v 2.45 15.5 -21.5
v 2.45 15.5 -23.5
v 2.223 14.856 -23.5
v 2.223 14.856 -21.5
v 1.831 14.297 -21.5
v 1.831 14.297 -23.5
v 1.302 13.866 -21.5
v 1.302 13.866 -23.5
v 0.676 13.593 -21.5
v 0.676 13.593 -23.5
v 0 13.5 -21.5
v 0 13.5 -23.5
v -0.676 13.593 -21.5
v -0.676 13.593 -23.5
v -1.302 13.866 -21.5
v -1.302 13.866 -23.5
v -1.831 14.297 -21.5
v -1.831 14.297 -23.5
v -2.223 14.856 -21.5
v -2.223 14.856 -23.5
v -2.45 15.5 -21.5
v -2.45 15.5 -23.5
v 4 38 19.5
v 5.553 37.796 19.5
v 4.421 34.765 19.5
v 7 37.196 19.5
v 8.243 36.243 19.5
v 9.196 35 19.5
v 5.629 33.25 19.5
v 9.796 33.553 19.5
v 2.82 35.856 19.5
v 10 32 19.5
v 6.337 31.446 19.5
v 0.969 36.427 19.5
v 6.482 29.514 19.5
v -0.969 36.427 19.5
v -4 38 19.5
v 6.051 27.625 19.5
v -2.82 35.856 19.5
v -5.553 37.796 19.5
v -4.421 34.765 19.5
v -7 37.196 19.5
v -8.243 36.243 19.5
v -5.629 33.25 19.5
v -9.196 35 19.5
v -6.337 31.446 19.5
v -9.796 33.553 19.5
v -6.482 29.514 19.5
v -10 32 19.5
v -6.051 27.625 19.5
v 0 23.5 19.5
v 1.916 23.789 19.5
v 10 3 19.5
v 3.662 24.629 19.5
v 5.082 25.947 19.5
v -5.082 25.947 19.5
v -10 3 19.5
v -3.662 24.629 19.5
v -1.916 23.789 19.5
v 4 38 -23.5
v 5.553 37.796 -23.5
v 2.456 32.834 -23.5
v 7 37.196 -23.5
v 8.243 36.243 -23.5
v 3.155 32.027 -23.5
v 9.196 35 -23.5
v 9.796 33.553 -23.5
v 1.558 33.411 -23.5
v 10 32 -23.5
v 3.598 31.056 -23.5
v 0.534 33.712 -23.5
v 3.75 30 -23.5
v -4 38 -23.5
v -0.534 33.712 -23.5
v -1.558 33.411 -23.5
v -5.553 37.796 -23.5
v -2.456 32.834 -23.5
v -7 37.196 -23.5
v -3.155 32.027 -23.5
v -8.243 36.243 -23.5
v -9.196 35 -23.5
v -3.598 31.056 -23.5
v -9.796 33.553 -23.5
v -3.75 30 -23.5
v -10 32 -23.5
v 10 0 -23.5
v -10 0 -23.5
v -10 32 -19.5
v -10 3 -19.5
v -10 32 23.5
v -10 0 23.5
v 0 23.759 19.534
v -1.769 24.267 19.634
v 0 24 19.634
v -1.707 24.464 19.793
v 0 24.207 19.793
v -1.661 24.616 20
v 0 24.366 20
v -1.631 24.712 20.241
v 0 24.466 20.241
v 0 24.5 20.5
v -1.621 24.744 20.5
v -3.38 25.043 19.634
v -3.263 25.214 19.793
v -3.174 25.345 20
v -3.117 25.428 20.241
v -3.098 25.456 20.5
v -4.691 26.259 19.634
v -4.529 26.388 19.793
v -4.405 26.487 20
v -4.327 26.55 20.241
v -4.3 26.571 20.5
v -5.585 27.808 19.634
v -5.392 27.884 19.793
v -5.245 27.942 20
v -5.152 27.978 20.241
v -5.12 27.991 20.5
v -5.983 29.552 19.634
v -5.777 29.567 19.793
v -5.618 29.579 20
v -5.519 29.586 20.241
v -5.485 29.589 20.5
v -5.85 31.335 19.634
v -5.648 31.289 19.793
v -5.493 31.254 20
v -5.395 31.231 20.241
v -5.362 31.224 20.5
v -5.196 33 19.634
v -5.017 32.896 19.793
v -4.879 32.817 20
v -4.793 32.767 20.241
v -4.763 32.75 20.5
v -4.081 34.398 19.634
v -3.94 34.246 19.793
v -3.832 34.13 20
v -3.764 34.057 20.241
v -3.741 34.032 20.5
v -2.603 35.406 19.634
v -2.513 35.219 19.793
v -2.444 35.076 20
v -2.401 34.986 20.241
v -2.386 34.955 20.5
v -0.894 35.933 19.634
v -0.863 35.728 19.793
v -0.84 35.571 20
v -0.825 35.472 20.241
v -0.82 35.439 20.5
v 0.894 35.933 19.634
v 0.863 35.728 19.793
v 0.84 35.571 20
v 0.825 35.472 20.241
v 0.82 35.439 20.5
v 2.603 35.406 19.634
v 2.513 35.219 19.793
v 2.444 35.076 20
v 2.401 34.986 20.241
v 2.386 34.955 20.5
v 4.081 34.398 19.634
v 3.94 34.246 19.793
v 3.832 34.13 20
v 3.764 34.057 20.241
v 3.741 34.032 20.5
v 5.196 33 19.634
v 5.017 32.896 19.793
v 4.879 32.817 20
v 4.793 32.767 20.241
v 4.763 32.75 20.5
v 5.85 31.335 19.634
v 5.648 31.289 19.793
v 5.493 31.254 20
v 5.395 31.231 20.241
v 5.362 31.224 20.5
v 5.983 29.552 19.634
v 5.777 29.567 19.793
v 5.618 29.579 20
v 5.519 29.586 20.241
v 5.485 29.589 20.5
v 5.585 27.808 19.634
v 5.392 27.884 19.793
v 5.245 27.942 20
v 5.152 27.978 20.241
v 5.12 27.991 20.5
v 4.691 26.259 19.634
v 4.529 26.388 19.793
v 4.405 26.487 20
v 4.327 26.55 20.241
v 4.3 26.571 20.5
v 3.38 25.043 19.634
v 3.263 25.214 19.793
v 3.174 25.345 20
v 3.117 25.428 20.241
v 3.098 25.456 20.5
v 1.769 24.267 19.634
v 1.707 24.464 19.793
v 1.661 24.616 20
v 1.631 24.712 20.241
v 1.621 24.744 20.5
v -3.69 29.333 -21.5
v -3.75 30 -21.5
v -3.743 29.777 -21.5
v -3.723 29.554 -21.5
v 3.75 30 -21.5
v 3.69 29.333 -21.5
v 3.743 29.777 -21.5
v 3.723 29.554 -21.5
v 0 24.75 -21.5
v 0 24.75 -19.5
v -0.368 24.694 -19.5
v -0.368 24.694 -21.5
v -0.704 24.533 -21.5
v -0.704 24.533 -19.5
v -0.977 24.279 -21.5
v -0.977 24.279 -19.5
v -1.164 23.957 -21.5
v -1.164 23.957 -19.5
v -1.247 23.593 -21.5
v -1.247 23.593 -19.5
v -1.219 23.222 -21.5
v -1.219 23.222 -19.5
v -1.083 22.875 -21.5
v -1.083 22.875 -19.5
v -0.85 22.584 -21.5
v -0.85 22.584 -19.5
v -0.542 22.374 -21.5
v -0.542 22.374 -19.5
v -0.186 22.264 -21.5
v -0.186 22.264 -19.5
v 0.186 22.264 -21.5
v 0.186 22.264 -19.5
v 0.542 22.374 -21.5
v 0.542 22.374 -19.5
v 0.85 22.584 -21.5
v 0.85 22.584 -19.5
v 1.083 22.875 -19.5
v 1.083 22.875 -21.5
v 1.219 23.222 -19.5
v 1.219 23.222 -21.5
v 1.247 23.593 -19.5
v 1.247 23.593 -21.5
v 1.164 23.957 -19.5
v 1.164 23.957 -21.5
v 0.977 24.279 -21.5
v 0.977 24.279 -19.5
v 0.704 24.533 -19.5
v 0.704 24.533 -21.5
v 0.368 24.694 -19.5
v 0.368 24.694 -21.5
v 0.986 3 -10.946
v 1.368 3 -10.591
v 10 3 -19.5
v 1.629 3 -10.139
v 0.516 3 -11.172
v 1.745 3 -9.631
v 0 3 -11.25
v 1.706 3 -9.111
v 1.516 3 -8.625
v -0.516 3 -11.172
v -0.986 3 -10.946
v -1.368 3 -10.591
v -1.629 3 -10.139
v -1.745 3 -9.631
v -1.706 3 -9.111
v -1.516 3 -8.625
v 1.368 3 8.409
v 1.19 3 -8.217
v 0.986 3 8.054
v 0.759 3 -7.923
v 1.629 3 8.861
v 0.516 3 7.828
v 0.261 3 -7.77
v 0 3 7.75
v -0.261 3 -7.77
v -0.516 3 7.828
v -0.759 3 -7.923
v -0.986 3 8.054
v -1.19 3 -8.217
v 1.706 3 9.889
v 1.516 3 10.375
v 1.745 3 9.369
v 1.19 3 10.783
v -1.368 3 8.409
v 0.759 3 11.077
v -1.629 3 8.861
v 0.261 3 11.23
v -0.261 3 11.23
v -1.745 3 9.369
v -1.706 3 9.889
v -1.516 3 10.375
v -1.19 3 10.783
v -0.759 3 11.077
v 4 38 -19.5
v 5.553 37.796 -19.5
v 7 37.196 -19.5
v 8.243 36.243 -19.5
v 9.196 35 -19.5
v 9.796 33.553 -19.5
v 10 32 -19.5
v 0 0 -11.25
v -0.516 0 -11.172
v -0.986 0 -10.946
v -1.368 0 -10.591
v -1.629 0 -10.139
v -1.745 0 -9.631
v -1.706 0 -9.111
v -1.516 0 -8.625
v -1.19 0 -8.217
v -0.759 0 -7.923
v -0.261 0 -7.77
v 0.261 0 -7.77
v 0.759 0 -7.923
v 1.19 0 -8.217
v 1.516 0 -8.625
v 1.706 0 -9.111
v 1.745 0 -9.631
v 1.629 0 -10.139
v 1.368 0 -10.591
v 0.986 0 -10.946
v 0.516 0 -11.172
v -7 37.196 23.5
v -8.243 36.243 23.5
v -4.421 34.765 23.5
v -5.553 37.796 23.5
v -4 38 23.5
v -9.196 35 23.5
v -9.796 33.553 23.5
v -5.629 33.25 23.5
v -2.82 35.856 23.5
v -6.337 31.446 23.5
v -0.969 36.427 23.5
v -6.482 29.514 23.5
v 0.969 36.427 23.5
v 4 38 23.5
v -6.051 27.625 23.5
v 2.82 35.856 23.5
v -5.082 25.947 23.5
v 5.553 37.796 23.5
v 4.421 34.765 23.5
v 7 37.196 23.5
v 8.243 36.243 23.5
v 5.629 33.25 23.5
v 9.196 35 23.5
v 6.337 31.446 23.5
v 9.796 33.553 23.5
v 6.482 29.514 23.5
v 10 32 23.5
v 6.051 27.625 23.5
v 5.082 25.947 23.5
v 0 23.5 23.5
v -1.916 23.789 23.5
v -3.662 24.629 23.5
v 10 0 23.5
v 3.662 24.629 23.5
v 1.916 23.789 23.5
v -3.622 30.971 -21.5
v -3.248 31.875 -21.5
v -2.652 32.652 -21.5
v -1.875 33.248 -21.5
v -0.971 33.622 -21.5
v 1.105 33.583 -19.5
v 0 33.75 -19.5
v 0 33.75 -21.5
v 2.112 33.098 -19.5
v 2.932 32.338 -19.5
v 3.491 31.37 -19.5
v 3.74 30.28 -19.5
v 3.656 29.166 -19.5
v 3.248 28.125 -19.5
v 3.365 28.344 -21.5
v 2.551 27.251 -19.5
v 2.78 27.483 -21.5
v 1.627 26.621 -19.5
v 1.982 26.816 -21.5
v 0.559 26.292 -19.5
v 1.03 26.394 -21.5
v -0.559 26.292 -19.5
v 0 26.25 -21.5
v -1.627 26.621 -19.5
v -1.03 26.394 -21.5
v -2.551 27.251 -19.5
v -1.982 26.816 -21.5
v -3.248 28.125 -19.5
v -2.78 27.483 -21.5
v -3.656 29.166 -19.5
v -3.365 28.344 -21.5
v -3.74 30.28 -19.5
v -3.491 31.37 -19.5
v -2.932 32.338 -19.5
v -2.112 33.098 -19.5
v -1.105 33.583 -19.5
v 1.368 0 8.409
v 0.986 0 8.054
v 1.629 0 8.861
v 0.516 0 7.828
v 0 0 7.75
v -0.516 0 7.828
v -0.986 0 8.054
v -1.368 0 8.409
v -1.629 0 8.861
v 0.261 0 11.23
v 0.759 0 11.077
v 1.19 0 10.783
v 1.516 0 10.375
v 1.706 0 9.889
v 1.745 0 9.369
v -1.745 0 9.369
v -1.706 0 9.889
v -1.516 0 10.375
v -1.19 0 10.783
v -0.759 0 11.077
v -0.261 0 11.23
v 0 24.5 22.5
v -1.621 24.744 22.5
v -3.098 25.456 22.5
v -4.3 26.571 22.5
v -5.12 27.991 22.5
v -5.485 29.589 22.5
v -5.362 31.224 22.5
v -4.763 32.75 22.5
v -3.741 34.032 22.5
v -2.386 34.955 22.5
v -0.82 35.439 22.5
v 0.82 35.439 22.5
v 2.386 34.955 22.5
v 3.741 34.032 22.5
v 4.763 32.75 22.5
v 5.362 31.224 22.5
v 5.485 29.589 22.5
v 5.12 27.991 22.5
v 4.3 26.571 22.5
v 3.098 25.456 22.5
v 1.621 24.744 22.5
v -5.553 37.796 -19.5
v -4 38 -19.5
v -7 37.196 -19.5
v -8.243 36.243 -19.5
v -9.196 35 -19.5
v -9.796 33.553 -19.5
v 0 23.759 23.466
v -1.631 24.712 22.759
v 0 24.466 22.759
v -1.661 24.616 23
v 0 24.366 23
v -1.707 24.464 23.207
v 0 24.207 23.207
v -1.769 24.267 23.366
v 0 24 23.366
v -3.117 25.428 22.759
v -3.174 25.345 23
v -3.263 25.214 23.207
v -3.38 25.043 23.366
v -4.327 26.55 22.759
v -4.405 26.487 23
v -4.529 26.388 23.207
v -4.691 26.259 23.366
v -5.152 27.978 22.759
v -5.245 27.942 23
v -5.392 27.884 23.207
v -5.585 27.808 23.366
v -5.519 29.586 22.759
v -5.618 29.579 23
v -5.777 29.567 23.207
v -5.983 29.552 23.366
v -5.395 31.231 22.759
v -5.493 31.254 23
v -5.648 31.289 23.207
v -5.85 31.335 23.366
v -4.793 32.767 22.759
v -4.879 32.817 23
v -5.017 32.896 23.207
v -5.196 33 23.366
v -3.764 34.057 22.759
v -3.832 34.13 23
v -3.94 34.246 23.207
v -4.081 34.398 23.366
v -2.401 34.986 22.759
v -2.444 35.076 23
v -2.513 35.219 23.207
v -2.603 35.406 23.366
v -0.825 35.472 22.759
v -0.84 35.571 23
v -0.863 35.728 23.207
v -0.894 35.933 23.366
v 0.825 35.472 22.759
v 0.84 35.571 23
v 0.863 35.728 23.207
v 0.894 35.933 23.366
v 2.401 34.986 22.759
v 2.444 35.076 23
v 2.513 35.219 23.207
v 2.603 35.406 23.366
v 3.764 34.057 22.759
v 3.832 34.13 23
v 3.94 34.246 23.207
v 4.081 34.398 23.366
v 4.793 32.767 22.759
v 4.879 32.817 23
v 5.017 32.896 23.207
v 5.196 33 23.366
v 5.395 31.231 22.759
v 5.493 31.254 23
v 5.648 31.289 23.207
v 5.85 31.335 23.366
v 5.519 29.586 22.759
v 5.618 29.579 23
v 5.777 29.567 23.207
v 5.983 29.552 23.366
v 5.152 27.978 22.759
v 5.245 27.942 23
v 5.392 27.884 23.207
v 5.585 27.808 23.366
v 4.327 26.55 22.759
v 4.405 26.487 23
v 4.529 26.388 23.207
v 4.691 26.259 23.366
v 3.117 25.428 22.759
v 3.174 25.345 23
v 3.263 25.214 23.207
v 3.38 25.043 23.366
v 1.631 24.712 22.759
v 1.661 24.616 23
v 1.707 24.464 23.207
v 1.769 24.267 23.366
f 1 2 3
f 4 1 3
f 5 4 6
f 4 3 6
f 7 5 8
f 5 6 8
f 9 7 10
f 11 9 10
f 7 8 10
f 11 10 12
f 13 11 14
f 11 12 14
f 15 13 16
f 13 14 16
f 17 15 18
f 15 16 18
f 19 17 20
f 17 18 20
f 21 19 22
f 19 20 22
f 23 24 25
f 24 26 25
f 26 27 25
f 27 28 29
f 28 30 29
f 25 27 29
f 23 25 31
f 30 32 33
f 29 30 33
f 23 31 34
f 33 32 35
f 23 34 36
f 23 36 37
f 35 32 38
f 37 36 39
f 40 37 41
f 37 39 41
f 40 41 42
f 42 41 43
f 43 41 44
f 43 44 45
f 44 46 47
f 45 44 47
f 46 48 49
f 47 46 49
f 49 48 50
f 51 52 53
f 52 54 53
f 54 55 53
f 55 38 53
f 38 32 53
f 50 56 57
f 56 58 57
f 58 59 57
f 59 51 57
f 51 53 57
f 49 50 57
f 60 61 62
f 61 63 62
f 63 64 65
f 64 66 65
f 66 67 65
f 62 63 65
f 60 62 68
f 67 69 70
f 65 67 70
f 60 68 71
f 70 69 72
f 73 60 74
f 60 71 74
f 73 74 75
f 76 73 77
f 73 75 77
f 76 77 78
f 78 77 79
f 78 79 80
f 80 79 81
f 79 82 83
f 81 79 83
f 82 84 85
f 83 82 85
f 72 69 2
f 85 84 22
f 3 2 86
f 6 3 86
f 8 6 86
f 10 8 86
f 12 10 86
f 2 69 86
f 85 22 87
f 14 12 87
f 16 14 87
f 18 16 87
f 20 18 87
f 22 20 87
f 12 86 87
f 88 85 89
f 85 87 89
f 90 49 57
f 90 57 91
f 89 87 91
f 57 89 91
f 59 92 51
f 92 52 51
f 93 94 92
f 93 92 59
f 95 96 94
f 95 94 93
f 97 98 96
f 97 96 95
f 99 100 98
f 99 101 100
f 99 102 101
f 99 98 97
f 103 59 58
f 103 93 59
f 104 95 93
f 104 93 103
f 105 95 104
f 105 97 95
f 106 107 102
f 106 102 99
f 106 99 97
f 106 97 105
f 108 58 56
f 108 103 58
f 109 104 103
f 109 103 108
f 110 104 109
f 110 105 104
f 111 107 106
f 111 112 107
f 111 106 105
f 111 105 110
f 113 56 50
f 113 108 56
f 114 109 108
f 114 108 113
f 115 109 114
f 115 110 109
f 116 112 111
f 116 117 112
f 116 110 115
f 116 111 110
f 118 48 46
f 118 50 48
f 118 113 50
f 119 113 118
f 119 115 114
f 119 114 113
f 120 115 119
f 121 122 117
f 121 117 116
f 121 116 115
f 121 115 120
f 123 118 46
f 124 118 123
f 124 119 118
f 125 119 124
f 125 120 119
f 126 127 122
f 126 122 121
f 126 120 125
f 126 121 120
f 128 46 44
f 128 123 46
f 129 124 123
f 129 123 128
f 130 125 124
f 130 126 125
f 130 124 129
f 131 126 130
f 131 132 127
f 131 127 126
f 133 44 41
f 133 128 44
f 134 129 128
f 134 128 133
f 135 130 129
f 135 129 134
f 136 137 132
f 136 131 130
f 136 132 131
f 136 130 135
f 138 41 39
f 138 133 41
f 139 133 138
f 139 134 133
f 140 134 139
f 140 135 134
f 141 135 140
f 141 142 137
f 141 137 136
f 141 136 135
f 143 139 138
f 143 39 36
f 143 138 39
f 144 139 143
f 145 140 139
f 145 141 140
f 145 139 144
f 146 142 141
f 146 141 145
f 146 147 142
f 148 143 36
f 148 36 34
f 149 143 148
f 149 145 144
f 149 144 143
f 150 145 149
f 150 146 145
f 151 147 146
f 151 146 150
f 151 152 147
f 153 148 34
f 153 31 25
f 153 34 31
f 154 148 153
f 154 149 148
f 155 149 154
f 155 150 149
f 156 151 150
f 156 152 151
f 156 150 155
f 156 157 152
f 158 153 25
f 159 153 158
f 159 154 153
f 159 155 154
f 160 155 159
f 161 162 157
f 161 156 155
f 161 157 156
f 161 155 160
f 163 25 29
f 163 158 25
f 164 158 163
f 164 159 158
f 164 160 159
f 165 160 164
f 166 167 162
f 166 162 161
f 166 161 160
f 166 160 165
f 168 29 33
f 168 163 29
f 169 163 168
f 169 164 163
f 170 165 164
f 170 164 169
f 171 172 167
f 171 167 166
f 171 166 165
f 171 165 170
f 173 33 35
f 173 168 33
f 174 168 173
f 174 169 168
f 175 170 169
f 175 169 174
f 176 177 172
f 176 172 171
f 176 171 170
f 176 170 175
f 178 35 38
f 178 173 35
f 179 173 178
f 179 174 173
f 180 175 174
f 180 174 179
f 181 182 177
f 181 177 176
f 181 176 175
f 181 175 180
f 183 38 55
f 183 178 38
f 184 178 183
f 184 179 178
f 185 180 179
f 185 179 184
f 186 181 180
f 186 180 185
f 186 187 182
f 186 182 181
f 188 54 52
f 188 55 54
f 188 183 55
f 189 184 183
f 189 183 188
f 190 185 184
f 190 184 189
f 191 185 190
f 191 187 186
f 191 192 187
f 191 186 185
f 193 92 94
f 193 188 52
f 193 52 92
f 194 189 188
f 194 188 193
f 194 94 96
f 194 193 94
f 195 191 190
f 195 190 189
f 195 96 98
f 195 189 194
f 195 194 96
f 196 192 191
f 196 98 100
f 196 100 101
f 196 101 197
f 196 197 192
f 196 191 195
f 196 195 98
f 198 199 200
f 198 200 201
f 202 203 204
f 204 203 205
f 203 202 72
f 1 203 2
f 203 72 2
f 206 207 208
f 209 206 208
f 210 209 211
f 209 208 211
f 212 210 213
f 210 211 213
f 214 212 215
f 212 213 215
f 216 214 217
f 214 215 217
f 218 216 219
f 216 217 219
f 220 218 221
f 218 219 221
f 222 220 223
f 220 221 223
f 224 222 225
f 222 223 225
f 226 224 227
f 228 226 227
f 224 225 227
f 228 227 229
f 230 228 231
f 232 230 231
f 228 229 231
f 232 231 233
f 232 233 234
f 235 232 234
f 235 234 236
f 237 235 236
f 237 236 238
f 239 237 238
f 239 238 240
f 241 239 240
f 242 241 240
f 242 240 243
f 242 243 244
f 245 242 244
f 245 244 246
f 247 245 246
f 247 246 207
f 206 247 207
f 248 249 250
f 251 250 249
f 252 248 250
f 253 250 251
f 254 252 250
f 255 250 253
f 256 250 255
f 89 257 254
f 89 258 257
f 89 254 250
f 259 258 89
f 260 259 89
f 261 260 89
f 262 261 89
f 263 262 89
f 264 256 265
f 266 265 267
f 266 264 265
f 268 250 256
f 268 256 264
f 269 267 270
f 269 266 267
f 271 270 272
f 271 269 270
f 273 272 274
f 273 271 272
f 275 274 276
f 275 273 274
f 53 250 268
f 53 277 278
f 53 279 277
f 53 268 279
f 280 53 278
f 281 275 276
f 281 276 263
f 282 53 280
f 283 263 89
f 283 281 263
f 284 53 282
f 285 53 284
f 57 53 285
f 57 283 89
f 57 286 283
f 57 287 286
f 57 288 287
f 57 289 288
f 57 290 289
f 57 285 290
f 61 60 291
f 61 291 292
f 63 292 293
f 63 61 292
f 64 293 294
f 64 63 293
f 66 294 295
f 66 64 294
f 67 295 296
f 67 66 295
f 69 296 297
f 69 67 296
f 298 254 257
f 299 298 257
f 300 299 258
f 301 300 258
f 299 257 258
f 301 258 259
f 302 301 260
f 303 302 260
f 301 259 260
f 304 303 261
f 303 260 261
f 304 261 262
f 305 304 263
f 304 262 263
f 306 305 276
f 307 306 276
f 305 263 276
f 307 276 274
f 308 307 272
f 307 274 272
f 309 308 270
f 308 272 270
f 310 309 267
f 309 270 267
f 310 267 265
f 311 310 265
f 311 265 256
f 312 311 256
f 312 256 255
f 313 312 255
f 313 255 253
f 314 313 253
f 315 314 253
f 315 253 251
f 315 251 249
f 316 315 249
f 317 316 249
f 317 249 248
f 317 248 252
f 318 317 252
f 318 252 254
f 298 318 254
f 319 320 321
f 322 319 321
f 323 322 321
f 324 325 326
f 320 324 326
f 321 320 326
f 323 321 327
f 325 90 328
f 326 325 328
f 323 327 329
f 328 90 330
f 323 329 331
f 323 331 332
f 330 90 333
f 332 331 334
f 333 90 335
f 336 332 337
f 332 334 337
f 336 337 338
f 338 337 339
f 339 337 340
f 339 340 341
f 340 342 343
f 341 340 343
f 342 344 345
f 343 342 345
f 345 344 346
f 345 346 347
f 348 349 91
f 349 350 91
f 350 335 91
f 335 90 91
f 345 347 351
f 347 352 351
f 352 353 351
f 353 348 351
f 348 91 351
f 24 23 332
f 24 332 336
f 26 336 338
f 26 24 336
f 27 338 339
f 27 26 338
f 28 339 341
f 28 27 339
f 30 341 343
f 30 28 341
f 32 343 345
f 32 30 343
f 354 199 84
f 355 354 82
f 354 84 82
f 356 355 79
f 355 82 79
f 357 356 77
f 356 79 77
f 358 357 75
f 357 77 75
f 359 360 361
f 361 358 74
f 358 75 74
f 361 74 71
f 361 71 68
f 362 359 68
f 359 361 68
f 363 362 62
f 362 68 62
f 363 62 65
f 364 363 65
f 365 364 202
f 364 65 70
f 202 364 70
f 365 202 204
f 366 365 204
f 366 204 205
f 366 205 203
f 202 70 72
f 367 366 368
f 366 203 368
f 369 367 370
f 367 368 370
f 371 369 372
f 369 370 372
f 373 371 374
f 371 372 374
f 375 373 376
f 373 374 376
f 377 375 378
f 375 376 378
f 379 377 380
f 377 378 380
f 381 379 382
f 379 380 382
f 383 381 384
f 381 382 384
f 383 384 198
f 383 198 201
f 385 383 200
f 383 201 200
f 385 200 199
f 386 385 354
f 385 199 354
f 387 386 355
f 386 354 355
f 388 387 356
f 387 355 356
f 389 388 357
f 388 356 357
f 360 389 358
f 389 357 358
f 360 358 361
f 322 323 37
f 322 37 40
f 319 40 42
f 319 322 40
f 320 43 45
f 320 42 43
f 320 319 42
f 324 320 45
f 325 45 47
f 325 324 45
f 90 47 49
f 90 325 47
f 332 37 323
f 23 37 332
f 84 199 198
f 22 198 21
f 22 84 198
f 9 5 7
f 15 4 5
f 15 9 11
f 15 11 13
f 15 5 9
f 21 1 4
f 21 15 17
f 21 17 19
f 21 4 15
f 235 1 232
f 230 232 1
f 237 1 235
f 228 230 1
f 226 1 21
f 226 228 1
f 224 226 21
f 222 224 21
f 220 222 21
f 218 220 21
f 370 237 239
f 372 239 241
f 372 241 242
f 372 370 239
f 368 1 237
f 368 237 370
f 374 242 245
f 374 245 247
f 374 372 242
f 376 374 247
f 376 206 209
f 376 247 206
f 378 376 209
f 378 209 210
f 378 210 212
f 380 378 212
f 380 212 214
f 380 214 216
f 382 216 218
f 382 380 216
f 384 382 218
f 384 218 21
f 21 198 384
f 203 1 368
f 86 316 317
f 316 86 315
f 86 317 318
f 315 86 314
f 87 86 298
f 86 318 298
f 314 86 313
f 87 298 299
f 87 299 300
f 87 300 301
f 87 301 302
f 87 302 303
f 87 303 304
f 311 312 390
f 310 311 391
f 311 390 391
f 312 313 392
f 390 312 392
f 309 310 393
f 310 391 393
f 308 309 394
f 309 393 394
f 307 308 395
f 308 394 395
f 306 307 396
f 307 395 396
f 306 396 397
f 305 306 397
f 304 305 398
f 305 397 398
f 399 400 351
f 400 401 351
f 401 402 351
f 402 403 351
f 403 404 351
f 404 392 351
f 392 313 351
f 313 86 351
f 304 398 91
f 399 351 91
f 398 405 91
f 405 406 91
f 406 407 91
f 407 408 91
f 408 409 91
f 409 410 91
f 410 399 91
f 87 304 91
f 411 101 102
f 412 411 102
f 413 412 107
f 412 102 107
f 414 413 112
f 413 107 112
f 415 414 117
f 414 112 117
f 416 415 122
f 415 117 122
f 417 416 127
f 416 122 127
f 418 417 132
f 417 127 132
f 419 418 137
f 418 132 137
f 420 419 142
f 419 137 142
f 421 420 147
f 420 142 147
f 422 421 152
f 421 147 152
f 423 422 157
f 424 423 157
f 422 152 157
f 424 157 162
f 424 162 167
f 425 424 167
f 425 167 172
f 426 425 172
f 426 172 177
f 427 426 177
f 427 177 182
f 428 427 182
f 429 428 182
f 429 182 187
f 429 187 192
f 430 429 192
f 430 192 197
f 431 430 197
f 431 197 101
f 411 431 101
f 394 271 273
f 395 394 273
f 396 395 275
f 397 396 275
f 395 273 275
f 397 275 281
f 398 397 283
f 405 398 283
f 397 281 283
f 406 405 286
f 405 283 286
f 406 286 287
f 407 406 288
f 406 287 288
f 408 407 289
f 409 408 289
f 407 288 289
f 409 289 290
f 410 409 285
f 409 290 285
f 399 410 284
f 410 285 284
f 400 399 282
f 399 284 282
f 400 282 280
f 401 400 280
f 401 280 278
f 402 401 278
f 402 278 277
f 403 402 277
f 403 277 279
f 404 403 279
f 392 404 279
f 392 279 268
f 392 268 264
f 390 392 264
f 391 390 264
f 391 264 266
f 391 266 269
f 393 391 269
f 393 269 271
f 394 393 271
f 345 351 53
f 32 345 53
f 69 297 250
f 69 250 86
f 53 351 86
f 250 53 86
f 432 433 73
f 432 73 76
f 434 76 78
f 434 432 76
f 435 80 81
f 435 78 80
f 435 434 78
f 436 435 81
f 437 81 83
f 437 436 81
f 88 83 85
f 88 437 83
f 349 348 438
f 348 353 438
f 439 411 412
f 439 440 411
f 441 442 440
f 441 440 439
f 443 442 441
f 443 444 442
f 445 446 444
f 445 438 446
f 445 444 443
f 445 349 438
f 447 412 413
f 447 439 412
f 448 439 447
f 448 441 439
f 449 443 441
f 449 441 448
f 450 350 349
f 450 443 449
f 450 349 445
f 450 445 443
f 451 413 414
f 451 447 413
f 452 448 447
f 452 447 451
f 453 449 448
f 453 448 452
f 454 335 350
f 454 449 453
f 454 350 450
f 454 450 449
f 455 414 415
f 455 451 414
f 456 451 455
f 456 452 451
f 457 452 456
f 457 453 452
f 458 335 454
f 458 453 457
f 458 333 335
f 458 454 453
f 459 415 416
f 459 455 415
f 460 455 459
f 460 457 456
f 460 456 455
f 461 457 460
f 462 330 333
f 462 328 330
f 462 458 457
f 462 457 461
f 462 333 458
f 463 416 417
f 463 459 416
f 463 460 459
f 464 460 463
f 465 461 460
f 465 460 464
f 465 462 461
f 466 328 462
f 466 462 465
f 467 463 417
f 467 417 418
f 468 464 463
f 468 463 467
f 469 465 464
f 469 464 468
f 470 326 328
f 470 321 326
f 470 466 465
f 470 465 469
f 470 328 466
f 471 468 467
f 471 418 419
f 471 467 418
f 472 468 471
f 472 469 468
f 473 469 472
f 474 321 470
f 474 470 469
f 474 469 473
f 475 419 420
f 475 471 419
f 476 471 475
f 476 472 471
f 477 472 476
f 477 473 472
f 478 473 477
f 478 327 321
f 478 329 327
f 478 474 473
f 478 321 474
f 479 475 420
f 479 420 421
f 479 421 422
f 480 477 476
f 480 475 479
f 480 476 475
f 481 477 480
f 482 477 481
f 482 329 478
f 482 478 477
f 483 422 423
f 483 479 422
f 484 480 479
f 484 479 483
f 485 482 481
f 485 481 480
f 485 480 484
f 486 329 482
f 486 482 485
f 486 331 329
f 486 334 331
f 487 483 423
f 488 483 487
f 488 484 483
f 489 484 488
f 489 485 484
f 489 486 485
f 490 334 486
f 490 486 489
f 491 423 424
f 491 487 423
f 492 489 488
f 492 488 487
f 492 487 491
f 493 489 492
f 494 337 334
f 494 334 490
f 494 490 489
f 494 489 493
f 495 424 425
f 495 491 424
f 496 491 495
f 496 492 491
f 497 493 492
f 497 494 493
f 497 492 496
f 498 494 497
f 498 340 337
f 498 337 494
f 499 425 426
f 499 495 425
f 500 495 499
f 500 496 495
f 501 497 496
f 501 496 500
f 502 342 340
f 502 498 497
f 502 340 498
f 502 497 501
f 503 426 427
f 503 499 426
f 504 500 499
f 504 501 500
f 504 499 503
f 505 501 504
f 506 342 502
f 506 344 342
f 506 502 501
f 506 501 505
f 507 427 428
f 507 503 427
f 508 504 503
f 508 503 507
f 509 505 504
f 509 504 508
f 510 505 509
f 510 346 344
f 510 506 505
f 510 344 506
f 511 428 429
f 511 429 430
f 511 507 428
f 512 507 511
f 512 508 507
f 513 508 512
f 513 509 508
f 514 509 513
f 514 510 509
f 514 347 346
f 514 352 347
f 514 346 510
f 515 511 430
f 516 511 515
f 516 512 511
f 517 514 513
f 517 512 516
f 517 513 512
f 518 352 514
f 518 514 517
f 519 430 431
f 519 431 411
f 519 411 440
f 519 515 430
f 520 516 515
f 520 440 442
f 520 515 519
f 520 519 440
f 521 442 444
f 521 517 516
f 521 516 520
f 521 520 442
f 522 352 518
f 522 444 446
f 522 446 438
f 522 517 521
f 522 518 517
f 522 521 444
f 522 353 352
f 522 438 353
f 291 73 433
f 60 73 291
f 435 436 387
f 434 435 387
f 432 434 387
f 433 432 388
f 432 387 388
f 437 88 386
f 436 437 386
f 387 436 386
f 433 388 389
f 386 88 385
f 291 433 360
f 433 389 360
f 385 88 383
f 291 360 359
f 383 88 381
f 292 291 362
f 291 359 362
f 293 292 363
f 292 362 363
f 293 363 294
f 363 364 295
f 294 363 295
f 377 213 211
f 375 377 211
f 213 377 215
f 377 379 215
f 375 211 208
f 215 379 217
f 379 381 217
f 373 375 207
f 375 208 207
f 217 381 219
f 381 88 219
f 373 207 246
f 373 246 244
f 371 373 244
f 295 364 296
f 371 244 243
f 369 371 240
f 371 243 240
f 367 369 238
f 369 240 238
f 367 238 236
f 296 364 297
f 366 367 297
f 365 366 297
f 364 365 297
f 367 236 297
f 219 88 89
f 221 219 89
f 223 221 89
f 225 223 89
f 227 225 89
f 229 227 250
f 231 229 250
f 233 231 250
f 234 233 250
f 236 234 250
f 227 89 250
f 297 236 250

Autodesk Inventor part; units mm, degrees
ref_plane "YZ Plane" through (0, 0, 0) normal (1, 0, 0) x (0, 1, 0)
ref_plane "XZ Plane" through (0, 0, 0) normal (0, 1, 0) x (-1, 0, 0)
ref_plane "XY Plane" through (0, 0, 0) normal (0, 0, 1) x (1, 0, 0)
sketch "Sketch1" plane through (0, 0, 0) normal (0, 1, 0) x (-1, 0, 0)
  line L0 (14, 0) -> (-14, 0) projected
  line L1 (0, -32.9) -> (0, 32.9) projected
  line L2 (10, 23.5) -> (-10, 23.5)
  line L3 (-10, 23.5) -> (-10, -23.5)
  line L4 (-10, -23.5) -> (10, -23.5)
  line L5 (10, -23.5) -> (10, 23.5)
  point P0 (0, 0)
  dimension "d0" = 47
  dimension "d1" = 20
extrude "Extrusion1" add sketch "Sketch1" along normal blind 3
sketch "Sketch2" plane through (0, 3, 0) normal (0, 1, 0) x (1, 0, 0)
  line L0 (-10, -23.5) -> (10, -23.5) projected
  line L1 (10, -23.5) -> (10, 23.5) projected
  line L2 (10, 23.5) -> (-10, 23.5) projected
  line L3 (-10, 23.5) -> (-10, -23.5) projected
  line L4 (-10, -23.5) -> (10, -23.5)
  line L5 (10, -23.5) -> (10, -19.5)
  line L6 (10, -19.5) -> (-10, -19.5)
  line L7 (-10, -19.5) -> (-10, -23.5)
  line L8 (-10, 19.5) -> (10, 19.5)
  line L9 (10, 19.5) -> (10, 23.5)
  line L10 (10, 23.5) -> (-10, 23.5)
  line L11 (-10, 23.5) -> (-10, 19.5)
  line L12 (-10, -23.5) -> (10, -23.5) projected
  line L13 (-10, 23.5) -> (-10, -23.5) projected
  line L14 (10, -23.5) -> (10, 23.5) projected
  line L15 (10, 23.5) -> (-10, 23.5) projected
  point P0 (0, 0)
  dimension "d4" = 4
  dimension "d5" = 4
extrude "Extrusion2" add sketch "Sketch2" along normal blind 35 contours L3 L6 L1 L0 | L3 L2 L1 L8
sketch "Sketch3" plane through (-10, 0, 23.5) normal (0, 0, 1) x (1, 0, 0)
  point P0 (10, 0)
sketch "Sketch4" plane through (-10, 0, 23.5) normal (0, 0, 1) x (1, 0, 0)
  line L0 (0, 0) -> (20, 0) projected
  line L1 (20, 0) -> (20, 38) projected
  line L2 (0, 38) -> (20, 38) projected
  line L3 (0, 0) -> (0, 38) projected
  point P0 (10, 0)
  point P1 (10, 30)
  dimension "d8" = 10
  dimension "d9" = 8
hole "Hole1" at (0, 30, 23.5) direction (0, 0, -1) diameter 11 depth 43
fillet "Fillet1" radius 6 4 edges at (10, 38, -21.5) (-10, 38, -21.5) (10, 38, 21.5) (-10, 38, 21.5)
sketch "Sketch8" plane through (0, 0, 0) normal (0, -1, 0) x (1, 0, 0)
  line L0 (-10, 23.5) -> (10, 23.5) projected
  line L1 (-10, -23.5) -> (-10, 23.5) projected
  line L2 (10, -23.5) -> (-10, -23.5) projected
  line L3 (10, 23.5) -> (10, -23.5) projected
  line L4 (-14, 0) -> (14, 0) projected
  line L5 (0, -32.9) -> (0, 32.9) projected
  line L6 (10, -19.5) -> (-10, -19.5) projected
  line L7 (-10, 19.5) -> (10, 19.5) projected
  point P0 (0, 0)
  point P1 (0, -9.5)
  point P2 (0, 9.5)
  dimension "d37" = 10
  dimension "d38" = 10
  dimension "d75" = 19
hole "Hole3" at (0, 0, 9.5) at (0, 0, -9.5) direction (0, 1, 0) diameter 3.5 end through all
sketch "Sketch10" plane through (10, 0, -23.5) normal (0, 0, -1) x (-1, 0, 0)
  arc A0 (20, 32) -> (14, 38) centre (14, 32) ccw projected
  line L0 (6, 38) -> (14, 38) projected
  arc A1 (6, 38) -> (0, 32) centre (6, 32) ccw projected
  line L1 (0, 0) -> (0, 32) projected
  line L2 (0, 0) -> (20, 0) projected
  line L3 (20, 0) -> (20, 32) projected
  circle A2 centre (10, 30) radius 5.5 projected
  circle A3 centre (10, 30) radius 3.75
  circle A4 centre (10, 16) radius 2.5
  line L4 (-6.7241, 13.5) -> (37.2046, 13.5) construction
  line L5 (6.25, 30) -> (7.5505, 15.5)
  line L6 (13.75, 30) -> (12.4495, 15.5)
  point P0 (10, 0)
  dimension "d47" = 16.5
  dimension "d48" = 7.5
  dimension "d49" = 5
  dimension "d50" = 10
  dimension "d51" = 2
  dimension "d52" = 2
  dimension "d53" = 8
  dimension "d54" = 8
extrude "Extrusion4" cut sketch "Sketch10" against normal blind 2 contours L5 A3 L6 A2 | A2 L6 A4 L5 | L5 A3 L6 | A4 L6 L5 picked at (9.6017, 25.1271)
sketch "Sketch11" plane through (10, 0, -21.5) normal (0, 0, -1) x (-1, 0, 0)
  line L0 (7.5505, 15.5) -> (6.25, 30) projected
  arc A0 (7.5505, 15.5) -> (12.4495, 15.5) centre (10, 16) ccw projected
  line L1 (13.75, 30) -> (12.4495, 15.5) projected
  arc A1 (13.75, 30) -> (6.25, 30) centre (10, 30) ccw projected
  point P0 (10, 0)
hole "Hole4" at (0, 30, -21.5) direction (0, 0, 1) diameter 7.5 depth 41
sketch "Sketch12" plane through (10, 0, -21.5) normal (0, 0, -1) x (-1, 0, 0)
  arc A0 (6.3099, 29.3327) -> (13.6901, 29.3327) centre (10, 30) ccw projected
  line L0 (7.5505, 15.5) -> (6.3099, 29.3327) projected
  arc A1 (7.5505, 15.5) -> (12.4495, 15.5) centre (10, 16) ccw projected
  line L1 (13.6901, 29.3327) -> (12.4495, 15.5) projected
  line L2 (0, 0) -> (0, 32) projected
  point P0 (10, 0)
  point P1 (10, 23.5)
  dimension "d64" = 6.5
  dimension "d65" = 10
hole "Hole5" at (0, 23.5, -21.5) direction (0, 0, 1) diameter 2.5 depth 41
fillet "Fillet2" radius 1 1 edges at (0, 35.5, 19.5)
fillet "Fillet3" radius 1 1 edges at (0, 35.5, 23.5)
properties part number "new_femur"
